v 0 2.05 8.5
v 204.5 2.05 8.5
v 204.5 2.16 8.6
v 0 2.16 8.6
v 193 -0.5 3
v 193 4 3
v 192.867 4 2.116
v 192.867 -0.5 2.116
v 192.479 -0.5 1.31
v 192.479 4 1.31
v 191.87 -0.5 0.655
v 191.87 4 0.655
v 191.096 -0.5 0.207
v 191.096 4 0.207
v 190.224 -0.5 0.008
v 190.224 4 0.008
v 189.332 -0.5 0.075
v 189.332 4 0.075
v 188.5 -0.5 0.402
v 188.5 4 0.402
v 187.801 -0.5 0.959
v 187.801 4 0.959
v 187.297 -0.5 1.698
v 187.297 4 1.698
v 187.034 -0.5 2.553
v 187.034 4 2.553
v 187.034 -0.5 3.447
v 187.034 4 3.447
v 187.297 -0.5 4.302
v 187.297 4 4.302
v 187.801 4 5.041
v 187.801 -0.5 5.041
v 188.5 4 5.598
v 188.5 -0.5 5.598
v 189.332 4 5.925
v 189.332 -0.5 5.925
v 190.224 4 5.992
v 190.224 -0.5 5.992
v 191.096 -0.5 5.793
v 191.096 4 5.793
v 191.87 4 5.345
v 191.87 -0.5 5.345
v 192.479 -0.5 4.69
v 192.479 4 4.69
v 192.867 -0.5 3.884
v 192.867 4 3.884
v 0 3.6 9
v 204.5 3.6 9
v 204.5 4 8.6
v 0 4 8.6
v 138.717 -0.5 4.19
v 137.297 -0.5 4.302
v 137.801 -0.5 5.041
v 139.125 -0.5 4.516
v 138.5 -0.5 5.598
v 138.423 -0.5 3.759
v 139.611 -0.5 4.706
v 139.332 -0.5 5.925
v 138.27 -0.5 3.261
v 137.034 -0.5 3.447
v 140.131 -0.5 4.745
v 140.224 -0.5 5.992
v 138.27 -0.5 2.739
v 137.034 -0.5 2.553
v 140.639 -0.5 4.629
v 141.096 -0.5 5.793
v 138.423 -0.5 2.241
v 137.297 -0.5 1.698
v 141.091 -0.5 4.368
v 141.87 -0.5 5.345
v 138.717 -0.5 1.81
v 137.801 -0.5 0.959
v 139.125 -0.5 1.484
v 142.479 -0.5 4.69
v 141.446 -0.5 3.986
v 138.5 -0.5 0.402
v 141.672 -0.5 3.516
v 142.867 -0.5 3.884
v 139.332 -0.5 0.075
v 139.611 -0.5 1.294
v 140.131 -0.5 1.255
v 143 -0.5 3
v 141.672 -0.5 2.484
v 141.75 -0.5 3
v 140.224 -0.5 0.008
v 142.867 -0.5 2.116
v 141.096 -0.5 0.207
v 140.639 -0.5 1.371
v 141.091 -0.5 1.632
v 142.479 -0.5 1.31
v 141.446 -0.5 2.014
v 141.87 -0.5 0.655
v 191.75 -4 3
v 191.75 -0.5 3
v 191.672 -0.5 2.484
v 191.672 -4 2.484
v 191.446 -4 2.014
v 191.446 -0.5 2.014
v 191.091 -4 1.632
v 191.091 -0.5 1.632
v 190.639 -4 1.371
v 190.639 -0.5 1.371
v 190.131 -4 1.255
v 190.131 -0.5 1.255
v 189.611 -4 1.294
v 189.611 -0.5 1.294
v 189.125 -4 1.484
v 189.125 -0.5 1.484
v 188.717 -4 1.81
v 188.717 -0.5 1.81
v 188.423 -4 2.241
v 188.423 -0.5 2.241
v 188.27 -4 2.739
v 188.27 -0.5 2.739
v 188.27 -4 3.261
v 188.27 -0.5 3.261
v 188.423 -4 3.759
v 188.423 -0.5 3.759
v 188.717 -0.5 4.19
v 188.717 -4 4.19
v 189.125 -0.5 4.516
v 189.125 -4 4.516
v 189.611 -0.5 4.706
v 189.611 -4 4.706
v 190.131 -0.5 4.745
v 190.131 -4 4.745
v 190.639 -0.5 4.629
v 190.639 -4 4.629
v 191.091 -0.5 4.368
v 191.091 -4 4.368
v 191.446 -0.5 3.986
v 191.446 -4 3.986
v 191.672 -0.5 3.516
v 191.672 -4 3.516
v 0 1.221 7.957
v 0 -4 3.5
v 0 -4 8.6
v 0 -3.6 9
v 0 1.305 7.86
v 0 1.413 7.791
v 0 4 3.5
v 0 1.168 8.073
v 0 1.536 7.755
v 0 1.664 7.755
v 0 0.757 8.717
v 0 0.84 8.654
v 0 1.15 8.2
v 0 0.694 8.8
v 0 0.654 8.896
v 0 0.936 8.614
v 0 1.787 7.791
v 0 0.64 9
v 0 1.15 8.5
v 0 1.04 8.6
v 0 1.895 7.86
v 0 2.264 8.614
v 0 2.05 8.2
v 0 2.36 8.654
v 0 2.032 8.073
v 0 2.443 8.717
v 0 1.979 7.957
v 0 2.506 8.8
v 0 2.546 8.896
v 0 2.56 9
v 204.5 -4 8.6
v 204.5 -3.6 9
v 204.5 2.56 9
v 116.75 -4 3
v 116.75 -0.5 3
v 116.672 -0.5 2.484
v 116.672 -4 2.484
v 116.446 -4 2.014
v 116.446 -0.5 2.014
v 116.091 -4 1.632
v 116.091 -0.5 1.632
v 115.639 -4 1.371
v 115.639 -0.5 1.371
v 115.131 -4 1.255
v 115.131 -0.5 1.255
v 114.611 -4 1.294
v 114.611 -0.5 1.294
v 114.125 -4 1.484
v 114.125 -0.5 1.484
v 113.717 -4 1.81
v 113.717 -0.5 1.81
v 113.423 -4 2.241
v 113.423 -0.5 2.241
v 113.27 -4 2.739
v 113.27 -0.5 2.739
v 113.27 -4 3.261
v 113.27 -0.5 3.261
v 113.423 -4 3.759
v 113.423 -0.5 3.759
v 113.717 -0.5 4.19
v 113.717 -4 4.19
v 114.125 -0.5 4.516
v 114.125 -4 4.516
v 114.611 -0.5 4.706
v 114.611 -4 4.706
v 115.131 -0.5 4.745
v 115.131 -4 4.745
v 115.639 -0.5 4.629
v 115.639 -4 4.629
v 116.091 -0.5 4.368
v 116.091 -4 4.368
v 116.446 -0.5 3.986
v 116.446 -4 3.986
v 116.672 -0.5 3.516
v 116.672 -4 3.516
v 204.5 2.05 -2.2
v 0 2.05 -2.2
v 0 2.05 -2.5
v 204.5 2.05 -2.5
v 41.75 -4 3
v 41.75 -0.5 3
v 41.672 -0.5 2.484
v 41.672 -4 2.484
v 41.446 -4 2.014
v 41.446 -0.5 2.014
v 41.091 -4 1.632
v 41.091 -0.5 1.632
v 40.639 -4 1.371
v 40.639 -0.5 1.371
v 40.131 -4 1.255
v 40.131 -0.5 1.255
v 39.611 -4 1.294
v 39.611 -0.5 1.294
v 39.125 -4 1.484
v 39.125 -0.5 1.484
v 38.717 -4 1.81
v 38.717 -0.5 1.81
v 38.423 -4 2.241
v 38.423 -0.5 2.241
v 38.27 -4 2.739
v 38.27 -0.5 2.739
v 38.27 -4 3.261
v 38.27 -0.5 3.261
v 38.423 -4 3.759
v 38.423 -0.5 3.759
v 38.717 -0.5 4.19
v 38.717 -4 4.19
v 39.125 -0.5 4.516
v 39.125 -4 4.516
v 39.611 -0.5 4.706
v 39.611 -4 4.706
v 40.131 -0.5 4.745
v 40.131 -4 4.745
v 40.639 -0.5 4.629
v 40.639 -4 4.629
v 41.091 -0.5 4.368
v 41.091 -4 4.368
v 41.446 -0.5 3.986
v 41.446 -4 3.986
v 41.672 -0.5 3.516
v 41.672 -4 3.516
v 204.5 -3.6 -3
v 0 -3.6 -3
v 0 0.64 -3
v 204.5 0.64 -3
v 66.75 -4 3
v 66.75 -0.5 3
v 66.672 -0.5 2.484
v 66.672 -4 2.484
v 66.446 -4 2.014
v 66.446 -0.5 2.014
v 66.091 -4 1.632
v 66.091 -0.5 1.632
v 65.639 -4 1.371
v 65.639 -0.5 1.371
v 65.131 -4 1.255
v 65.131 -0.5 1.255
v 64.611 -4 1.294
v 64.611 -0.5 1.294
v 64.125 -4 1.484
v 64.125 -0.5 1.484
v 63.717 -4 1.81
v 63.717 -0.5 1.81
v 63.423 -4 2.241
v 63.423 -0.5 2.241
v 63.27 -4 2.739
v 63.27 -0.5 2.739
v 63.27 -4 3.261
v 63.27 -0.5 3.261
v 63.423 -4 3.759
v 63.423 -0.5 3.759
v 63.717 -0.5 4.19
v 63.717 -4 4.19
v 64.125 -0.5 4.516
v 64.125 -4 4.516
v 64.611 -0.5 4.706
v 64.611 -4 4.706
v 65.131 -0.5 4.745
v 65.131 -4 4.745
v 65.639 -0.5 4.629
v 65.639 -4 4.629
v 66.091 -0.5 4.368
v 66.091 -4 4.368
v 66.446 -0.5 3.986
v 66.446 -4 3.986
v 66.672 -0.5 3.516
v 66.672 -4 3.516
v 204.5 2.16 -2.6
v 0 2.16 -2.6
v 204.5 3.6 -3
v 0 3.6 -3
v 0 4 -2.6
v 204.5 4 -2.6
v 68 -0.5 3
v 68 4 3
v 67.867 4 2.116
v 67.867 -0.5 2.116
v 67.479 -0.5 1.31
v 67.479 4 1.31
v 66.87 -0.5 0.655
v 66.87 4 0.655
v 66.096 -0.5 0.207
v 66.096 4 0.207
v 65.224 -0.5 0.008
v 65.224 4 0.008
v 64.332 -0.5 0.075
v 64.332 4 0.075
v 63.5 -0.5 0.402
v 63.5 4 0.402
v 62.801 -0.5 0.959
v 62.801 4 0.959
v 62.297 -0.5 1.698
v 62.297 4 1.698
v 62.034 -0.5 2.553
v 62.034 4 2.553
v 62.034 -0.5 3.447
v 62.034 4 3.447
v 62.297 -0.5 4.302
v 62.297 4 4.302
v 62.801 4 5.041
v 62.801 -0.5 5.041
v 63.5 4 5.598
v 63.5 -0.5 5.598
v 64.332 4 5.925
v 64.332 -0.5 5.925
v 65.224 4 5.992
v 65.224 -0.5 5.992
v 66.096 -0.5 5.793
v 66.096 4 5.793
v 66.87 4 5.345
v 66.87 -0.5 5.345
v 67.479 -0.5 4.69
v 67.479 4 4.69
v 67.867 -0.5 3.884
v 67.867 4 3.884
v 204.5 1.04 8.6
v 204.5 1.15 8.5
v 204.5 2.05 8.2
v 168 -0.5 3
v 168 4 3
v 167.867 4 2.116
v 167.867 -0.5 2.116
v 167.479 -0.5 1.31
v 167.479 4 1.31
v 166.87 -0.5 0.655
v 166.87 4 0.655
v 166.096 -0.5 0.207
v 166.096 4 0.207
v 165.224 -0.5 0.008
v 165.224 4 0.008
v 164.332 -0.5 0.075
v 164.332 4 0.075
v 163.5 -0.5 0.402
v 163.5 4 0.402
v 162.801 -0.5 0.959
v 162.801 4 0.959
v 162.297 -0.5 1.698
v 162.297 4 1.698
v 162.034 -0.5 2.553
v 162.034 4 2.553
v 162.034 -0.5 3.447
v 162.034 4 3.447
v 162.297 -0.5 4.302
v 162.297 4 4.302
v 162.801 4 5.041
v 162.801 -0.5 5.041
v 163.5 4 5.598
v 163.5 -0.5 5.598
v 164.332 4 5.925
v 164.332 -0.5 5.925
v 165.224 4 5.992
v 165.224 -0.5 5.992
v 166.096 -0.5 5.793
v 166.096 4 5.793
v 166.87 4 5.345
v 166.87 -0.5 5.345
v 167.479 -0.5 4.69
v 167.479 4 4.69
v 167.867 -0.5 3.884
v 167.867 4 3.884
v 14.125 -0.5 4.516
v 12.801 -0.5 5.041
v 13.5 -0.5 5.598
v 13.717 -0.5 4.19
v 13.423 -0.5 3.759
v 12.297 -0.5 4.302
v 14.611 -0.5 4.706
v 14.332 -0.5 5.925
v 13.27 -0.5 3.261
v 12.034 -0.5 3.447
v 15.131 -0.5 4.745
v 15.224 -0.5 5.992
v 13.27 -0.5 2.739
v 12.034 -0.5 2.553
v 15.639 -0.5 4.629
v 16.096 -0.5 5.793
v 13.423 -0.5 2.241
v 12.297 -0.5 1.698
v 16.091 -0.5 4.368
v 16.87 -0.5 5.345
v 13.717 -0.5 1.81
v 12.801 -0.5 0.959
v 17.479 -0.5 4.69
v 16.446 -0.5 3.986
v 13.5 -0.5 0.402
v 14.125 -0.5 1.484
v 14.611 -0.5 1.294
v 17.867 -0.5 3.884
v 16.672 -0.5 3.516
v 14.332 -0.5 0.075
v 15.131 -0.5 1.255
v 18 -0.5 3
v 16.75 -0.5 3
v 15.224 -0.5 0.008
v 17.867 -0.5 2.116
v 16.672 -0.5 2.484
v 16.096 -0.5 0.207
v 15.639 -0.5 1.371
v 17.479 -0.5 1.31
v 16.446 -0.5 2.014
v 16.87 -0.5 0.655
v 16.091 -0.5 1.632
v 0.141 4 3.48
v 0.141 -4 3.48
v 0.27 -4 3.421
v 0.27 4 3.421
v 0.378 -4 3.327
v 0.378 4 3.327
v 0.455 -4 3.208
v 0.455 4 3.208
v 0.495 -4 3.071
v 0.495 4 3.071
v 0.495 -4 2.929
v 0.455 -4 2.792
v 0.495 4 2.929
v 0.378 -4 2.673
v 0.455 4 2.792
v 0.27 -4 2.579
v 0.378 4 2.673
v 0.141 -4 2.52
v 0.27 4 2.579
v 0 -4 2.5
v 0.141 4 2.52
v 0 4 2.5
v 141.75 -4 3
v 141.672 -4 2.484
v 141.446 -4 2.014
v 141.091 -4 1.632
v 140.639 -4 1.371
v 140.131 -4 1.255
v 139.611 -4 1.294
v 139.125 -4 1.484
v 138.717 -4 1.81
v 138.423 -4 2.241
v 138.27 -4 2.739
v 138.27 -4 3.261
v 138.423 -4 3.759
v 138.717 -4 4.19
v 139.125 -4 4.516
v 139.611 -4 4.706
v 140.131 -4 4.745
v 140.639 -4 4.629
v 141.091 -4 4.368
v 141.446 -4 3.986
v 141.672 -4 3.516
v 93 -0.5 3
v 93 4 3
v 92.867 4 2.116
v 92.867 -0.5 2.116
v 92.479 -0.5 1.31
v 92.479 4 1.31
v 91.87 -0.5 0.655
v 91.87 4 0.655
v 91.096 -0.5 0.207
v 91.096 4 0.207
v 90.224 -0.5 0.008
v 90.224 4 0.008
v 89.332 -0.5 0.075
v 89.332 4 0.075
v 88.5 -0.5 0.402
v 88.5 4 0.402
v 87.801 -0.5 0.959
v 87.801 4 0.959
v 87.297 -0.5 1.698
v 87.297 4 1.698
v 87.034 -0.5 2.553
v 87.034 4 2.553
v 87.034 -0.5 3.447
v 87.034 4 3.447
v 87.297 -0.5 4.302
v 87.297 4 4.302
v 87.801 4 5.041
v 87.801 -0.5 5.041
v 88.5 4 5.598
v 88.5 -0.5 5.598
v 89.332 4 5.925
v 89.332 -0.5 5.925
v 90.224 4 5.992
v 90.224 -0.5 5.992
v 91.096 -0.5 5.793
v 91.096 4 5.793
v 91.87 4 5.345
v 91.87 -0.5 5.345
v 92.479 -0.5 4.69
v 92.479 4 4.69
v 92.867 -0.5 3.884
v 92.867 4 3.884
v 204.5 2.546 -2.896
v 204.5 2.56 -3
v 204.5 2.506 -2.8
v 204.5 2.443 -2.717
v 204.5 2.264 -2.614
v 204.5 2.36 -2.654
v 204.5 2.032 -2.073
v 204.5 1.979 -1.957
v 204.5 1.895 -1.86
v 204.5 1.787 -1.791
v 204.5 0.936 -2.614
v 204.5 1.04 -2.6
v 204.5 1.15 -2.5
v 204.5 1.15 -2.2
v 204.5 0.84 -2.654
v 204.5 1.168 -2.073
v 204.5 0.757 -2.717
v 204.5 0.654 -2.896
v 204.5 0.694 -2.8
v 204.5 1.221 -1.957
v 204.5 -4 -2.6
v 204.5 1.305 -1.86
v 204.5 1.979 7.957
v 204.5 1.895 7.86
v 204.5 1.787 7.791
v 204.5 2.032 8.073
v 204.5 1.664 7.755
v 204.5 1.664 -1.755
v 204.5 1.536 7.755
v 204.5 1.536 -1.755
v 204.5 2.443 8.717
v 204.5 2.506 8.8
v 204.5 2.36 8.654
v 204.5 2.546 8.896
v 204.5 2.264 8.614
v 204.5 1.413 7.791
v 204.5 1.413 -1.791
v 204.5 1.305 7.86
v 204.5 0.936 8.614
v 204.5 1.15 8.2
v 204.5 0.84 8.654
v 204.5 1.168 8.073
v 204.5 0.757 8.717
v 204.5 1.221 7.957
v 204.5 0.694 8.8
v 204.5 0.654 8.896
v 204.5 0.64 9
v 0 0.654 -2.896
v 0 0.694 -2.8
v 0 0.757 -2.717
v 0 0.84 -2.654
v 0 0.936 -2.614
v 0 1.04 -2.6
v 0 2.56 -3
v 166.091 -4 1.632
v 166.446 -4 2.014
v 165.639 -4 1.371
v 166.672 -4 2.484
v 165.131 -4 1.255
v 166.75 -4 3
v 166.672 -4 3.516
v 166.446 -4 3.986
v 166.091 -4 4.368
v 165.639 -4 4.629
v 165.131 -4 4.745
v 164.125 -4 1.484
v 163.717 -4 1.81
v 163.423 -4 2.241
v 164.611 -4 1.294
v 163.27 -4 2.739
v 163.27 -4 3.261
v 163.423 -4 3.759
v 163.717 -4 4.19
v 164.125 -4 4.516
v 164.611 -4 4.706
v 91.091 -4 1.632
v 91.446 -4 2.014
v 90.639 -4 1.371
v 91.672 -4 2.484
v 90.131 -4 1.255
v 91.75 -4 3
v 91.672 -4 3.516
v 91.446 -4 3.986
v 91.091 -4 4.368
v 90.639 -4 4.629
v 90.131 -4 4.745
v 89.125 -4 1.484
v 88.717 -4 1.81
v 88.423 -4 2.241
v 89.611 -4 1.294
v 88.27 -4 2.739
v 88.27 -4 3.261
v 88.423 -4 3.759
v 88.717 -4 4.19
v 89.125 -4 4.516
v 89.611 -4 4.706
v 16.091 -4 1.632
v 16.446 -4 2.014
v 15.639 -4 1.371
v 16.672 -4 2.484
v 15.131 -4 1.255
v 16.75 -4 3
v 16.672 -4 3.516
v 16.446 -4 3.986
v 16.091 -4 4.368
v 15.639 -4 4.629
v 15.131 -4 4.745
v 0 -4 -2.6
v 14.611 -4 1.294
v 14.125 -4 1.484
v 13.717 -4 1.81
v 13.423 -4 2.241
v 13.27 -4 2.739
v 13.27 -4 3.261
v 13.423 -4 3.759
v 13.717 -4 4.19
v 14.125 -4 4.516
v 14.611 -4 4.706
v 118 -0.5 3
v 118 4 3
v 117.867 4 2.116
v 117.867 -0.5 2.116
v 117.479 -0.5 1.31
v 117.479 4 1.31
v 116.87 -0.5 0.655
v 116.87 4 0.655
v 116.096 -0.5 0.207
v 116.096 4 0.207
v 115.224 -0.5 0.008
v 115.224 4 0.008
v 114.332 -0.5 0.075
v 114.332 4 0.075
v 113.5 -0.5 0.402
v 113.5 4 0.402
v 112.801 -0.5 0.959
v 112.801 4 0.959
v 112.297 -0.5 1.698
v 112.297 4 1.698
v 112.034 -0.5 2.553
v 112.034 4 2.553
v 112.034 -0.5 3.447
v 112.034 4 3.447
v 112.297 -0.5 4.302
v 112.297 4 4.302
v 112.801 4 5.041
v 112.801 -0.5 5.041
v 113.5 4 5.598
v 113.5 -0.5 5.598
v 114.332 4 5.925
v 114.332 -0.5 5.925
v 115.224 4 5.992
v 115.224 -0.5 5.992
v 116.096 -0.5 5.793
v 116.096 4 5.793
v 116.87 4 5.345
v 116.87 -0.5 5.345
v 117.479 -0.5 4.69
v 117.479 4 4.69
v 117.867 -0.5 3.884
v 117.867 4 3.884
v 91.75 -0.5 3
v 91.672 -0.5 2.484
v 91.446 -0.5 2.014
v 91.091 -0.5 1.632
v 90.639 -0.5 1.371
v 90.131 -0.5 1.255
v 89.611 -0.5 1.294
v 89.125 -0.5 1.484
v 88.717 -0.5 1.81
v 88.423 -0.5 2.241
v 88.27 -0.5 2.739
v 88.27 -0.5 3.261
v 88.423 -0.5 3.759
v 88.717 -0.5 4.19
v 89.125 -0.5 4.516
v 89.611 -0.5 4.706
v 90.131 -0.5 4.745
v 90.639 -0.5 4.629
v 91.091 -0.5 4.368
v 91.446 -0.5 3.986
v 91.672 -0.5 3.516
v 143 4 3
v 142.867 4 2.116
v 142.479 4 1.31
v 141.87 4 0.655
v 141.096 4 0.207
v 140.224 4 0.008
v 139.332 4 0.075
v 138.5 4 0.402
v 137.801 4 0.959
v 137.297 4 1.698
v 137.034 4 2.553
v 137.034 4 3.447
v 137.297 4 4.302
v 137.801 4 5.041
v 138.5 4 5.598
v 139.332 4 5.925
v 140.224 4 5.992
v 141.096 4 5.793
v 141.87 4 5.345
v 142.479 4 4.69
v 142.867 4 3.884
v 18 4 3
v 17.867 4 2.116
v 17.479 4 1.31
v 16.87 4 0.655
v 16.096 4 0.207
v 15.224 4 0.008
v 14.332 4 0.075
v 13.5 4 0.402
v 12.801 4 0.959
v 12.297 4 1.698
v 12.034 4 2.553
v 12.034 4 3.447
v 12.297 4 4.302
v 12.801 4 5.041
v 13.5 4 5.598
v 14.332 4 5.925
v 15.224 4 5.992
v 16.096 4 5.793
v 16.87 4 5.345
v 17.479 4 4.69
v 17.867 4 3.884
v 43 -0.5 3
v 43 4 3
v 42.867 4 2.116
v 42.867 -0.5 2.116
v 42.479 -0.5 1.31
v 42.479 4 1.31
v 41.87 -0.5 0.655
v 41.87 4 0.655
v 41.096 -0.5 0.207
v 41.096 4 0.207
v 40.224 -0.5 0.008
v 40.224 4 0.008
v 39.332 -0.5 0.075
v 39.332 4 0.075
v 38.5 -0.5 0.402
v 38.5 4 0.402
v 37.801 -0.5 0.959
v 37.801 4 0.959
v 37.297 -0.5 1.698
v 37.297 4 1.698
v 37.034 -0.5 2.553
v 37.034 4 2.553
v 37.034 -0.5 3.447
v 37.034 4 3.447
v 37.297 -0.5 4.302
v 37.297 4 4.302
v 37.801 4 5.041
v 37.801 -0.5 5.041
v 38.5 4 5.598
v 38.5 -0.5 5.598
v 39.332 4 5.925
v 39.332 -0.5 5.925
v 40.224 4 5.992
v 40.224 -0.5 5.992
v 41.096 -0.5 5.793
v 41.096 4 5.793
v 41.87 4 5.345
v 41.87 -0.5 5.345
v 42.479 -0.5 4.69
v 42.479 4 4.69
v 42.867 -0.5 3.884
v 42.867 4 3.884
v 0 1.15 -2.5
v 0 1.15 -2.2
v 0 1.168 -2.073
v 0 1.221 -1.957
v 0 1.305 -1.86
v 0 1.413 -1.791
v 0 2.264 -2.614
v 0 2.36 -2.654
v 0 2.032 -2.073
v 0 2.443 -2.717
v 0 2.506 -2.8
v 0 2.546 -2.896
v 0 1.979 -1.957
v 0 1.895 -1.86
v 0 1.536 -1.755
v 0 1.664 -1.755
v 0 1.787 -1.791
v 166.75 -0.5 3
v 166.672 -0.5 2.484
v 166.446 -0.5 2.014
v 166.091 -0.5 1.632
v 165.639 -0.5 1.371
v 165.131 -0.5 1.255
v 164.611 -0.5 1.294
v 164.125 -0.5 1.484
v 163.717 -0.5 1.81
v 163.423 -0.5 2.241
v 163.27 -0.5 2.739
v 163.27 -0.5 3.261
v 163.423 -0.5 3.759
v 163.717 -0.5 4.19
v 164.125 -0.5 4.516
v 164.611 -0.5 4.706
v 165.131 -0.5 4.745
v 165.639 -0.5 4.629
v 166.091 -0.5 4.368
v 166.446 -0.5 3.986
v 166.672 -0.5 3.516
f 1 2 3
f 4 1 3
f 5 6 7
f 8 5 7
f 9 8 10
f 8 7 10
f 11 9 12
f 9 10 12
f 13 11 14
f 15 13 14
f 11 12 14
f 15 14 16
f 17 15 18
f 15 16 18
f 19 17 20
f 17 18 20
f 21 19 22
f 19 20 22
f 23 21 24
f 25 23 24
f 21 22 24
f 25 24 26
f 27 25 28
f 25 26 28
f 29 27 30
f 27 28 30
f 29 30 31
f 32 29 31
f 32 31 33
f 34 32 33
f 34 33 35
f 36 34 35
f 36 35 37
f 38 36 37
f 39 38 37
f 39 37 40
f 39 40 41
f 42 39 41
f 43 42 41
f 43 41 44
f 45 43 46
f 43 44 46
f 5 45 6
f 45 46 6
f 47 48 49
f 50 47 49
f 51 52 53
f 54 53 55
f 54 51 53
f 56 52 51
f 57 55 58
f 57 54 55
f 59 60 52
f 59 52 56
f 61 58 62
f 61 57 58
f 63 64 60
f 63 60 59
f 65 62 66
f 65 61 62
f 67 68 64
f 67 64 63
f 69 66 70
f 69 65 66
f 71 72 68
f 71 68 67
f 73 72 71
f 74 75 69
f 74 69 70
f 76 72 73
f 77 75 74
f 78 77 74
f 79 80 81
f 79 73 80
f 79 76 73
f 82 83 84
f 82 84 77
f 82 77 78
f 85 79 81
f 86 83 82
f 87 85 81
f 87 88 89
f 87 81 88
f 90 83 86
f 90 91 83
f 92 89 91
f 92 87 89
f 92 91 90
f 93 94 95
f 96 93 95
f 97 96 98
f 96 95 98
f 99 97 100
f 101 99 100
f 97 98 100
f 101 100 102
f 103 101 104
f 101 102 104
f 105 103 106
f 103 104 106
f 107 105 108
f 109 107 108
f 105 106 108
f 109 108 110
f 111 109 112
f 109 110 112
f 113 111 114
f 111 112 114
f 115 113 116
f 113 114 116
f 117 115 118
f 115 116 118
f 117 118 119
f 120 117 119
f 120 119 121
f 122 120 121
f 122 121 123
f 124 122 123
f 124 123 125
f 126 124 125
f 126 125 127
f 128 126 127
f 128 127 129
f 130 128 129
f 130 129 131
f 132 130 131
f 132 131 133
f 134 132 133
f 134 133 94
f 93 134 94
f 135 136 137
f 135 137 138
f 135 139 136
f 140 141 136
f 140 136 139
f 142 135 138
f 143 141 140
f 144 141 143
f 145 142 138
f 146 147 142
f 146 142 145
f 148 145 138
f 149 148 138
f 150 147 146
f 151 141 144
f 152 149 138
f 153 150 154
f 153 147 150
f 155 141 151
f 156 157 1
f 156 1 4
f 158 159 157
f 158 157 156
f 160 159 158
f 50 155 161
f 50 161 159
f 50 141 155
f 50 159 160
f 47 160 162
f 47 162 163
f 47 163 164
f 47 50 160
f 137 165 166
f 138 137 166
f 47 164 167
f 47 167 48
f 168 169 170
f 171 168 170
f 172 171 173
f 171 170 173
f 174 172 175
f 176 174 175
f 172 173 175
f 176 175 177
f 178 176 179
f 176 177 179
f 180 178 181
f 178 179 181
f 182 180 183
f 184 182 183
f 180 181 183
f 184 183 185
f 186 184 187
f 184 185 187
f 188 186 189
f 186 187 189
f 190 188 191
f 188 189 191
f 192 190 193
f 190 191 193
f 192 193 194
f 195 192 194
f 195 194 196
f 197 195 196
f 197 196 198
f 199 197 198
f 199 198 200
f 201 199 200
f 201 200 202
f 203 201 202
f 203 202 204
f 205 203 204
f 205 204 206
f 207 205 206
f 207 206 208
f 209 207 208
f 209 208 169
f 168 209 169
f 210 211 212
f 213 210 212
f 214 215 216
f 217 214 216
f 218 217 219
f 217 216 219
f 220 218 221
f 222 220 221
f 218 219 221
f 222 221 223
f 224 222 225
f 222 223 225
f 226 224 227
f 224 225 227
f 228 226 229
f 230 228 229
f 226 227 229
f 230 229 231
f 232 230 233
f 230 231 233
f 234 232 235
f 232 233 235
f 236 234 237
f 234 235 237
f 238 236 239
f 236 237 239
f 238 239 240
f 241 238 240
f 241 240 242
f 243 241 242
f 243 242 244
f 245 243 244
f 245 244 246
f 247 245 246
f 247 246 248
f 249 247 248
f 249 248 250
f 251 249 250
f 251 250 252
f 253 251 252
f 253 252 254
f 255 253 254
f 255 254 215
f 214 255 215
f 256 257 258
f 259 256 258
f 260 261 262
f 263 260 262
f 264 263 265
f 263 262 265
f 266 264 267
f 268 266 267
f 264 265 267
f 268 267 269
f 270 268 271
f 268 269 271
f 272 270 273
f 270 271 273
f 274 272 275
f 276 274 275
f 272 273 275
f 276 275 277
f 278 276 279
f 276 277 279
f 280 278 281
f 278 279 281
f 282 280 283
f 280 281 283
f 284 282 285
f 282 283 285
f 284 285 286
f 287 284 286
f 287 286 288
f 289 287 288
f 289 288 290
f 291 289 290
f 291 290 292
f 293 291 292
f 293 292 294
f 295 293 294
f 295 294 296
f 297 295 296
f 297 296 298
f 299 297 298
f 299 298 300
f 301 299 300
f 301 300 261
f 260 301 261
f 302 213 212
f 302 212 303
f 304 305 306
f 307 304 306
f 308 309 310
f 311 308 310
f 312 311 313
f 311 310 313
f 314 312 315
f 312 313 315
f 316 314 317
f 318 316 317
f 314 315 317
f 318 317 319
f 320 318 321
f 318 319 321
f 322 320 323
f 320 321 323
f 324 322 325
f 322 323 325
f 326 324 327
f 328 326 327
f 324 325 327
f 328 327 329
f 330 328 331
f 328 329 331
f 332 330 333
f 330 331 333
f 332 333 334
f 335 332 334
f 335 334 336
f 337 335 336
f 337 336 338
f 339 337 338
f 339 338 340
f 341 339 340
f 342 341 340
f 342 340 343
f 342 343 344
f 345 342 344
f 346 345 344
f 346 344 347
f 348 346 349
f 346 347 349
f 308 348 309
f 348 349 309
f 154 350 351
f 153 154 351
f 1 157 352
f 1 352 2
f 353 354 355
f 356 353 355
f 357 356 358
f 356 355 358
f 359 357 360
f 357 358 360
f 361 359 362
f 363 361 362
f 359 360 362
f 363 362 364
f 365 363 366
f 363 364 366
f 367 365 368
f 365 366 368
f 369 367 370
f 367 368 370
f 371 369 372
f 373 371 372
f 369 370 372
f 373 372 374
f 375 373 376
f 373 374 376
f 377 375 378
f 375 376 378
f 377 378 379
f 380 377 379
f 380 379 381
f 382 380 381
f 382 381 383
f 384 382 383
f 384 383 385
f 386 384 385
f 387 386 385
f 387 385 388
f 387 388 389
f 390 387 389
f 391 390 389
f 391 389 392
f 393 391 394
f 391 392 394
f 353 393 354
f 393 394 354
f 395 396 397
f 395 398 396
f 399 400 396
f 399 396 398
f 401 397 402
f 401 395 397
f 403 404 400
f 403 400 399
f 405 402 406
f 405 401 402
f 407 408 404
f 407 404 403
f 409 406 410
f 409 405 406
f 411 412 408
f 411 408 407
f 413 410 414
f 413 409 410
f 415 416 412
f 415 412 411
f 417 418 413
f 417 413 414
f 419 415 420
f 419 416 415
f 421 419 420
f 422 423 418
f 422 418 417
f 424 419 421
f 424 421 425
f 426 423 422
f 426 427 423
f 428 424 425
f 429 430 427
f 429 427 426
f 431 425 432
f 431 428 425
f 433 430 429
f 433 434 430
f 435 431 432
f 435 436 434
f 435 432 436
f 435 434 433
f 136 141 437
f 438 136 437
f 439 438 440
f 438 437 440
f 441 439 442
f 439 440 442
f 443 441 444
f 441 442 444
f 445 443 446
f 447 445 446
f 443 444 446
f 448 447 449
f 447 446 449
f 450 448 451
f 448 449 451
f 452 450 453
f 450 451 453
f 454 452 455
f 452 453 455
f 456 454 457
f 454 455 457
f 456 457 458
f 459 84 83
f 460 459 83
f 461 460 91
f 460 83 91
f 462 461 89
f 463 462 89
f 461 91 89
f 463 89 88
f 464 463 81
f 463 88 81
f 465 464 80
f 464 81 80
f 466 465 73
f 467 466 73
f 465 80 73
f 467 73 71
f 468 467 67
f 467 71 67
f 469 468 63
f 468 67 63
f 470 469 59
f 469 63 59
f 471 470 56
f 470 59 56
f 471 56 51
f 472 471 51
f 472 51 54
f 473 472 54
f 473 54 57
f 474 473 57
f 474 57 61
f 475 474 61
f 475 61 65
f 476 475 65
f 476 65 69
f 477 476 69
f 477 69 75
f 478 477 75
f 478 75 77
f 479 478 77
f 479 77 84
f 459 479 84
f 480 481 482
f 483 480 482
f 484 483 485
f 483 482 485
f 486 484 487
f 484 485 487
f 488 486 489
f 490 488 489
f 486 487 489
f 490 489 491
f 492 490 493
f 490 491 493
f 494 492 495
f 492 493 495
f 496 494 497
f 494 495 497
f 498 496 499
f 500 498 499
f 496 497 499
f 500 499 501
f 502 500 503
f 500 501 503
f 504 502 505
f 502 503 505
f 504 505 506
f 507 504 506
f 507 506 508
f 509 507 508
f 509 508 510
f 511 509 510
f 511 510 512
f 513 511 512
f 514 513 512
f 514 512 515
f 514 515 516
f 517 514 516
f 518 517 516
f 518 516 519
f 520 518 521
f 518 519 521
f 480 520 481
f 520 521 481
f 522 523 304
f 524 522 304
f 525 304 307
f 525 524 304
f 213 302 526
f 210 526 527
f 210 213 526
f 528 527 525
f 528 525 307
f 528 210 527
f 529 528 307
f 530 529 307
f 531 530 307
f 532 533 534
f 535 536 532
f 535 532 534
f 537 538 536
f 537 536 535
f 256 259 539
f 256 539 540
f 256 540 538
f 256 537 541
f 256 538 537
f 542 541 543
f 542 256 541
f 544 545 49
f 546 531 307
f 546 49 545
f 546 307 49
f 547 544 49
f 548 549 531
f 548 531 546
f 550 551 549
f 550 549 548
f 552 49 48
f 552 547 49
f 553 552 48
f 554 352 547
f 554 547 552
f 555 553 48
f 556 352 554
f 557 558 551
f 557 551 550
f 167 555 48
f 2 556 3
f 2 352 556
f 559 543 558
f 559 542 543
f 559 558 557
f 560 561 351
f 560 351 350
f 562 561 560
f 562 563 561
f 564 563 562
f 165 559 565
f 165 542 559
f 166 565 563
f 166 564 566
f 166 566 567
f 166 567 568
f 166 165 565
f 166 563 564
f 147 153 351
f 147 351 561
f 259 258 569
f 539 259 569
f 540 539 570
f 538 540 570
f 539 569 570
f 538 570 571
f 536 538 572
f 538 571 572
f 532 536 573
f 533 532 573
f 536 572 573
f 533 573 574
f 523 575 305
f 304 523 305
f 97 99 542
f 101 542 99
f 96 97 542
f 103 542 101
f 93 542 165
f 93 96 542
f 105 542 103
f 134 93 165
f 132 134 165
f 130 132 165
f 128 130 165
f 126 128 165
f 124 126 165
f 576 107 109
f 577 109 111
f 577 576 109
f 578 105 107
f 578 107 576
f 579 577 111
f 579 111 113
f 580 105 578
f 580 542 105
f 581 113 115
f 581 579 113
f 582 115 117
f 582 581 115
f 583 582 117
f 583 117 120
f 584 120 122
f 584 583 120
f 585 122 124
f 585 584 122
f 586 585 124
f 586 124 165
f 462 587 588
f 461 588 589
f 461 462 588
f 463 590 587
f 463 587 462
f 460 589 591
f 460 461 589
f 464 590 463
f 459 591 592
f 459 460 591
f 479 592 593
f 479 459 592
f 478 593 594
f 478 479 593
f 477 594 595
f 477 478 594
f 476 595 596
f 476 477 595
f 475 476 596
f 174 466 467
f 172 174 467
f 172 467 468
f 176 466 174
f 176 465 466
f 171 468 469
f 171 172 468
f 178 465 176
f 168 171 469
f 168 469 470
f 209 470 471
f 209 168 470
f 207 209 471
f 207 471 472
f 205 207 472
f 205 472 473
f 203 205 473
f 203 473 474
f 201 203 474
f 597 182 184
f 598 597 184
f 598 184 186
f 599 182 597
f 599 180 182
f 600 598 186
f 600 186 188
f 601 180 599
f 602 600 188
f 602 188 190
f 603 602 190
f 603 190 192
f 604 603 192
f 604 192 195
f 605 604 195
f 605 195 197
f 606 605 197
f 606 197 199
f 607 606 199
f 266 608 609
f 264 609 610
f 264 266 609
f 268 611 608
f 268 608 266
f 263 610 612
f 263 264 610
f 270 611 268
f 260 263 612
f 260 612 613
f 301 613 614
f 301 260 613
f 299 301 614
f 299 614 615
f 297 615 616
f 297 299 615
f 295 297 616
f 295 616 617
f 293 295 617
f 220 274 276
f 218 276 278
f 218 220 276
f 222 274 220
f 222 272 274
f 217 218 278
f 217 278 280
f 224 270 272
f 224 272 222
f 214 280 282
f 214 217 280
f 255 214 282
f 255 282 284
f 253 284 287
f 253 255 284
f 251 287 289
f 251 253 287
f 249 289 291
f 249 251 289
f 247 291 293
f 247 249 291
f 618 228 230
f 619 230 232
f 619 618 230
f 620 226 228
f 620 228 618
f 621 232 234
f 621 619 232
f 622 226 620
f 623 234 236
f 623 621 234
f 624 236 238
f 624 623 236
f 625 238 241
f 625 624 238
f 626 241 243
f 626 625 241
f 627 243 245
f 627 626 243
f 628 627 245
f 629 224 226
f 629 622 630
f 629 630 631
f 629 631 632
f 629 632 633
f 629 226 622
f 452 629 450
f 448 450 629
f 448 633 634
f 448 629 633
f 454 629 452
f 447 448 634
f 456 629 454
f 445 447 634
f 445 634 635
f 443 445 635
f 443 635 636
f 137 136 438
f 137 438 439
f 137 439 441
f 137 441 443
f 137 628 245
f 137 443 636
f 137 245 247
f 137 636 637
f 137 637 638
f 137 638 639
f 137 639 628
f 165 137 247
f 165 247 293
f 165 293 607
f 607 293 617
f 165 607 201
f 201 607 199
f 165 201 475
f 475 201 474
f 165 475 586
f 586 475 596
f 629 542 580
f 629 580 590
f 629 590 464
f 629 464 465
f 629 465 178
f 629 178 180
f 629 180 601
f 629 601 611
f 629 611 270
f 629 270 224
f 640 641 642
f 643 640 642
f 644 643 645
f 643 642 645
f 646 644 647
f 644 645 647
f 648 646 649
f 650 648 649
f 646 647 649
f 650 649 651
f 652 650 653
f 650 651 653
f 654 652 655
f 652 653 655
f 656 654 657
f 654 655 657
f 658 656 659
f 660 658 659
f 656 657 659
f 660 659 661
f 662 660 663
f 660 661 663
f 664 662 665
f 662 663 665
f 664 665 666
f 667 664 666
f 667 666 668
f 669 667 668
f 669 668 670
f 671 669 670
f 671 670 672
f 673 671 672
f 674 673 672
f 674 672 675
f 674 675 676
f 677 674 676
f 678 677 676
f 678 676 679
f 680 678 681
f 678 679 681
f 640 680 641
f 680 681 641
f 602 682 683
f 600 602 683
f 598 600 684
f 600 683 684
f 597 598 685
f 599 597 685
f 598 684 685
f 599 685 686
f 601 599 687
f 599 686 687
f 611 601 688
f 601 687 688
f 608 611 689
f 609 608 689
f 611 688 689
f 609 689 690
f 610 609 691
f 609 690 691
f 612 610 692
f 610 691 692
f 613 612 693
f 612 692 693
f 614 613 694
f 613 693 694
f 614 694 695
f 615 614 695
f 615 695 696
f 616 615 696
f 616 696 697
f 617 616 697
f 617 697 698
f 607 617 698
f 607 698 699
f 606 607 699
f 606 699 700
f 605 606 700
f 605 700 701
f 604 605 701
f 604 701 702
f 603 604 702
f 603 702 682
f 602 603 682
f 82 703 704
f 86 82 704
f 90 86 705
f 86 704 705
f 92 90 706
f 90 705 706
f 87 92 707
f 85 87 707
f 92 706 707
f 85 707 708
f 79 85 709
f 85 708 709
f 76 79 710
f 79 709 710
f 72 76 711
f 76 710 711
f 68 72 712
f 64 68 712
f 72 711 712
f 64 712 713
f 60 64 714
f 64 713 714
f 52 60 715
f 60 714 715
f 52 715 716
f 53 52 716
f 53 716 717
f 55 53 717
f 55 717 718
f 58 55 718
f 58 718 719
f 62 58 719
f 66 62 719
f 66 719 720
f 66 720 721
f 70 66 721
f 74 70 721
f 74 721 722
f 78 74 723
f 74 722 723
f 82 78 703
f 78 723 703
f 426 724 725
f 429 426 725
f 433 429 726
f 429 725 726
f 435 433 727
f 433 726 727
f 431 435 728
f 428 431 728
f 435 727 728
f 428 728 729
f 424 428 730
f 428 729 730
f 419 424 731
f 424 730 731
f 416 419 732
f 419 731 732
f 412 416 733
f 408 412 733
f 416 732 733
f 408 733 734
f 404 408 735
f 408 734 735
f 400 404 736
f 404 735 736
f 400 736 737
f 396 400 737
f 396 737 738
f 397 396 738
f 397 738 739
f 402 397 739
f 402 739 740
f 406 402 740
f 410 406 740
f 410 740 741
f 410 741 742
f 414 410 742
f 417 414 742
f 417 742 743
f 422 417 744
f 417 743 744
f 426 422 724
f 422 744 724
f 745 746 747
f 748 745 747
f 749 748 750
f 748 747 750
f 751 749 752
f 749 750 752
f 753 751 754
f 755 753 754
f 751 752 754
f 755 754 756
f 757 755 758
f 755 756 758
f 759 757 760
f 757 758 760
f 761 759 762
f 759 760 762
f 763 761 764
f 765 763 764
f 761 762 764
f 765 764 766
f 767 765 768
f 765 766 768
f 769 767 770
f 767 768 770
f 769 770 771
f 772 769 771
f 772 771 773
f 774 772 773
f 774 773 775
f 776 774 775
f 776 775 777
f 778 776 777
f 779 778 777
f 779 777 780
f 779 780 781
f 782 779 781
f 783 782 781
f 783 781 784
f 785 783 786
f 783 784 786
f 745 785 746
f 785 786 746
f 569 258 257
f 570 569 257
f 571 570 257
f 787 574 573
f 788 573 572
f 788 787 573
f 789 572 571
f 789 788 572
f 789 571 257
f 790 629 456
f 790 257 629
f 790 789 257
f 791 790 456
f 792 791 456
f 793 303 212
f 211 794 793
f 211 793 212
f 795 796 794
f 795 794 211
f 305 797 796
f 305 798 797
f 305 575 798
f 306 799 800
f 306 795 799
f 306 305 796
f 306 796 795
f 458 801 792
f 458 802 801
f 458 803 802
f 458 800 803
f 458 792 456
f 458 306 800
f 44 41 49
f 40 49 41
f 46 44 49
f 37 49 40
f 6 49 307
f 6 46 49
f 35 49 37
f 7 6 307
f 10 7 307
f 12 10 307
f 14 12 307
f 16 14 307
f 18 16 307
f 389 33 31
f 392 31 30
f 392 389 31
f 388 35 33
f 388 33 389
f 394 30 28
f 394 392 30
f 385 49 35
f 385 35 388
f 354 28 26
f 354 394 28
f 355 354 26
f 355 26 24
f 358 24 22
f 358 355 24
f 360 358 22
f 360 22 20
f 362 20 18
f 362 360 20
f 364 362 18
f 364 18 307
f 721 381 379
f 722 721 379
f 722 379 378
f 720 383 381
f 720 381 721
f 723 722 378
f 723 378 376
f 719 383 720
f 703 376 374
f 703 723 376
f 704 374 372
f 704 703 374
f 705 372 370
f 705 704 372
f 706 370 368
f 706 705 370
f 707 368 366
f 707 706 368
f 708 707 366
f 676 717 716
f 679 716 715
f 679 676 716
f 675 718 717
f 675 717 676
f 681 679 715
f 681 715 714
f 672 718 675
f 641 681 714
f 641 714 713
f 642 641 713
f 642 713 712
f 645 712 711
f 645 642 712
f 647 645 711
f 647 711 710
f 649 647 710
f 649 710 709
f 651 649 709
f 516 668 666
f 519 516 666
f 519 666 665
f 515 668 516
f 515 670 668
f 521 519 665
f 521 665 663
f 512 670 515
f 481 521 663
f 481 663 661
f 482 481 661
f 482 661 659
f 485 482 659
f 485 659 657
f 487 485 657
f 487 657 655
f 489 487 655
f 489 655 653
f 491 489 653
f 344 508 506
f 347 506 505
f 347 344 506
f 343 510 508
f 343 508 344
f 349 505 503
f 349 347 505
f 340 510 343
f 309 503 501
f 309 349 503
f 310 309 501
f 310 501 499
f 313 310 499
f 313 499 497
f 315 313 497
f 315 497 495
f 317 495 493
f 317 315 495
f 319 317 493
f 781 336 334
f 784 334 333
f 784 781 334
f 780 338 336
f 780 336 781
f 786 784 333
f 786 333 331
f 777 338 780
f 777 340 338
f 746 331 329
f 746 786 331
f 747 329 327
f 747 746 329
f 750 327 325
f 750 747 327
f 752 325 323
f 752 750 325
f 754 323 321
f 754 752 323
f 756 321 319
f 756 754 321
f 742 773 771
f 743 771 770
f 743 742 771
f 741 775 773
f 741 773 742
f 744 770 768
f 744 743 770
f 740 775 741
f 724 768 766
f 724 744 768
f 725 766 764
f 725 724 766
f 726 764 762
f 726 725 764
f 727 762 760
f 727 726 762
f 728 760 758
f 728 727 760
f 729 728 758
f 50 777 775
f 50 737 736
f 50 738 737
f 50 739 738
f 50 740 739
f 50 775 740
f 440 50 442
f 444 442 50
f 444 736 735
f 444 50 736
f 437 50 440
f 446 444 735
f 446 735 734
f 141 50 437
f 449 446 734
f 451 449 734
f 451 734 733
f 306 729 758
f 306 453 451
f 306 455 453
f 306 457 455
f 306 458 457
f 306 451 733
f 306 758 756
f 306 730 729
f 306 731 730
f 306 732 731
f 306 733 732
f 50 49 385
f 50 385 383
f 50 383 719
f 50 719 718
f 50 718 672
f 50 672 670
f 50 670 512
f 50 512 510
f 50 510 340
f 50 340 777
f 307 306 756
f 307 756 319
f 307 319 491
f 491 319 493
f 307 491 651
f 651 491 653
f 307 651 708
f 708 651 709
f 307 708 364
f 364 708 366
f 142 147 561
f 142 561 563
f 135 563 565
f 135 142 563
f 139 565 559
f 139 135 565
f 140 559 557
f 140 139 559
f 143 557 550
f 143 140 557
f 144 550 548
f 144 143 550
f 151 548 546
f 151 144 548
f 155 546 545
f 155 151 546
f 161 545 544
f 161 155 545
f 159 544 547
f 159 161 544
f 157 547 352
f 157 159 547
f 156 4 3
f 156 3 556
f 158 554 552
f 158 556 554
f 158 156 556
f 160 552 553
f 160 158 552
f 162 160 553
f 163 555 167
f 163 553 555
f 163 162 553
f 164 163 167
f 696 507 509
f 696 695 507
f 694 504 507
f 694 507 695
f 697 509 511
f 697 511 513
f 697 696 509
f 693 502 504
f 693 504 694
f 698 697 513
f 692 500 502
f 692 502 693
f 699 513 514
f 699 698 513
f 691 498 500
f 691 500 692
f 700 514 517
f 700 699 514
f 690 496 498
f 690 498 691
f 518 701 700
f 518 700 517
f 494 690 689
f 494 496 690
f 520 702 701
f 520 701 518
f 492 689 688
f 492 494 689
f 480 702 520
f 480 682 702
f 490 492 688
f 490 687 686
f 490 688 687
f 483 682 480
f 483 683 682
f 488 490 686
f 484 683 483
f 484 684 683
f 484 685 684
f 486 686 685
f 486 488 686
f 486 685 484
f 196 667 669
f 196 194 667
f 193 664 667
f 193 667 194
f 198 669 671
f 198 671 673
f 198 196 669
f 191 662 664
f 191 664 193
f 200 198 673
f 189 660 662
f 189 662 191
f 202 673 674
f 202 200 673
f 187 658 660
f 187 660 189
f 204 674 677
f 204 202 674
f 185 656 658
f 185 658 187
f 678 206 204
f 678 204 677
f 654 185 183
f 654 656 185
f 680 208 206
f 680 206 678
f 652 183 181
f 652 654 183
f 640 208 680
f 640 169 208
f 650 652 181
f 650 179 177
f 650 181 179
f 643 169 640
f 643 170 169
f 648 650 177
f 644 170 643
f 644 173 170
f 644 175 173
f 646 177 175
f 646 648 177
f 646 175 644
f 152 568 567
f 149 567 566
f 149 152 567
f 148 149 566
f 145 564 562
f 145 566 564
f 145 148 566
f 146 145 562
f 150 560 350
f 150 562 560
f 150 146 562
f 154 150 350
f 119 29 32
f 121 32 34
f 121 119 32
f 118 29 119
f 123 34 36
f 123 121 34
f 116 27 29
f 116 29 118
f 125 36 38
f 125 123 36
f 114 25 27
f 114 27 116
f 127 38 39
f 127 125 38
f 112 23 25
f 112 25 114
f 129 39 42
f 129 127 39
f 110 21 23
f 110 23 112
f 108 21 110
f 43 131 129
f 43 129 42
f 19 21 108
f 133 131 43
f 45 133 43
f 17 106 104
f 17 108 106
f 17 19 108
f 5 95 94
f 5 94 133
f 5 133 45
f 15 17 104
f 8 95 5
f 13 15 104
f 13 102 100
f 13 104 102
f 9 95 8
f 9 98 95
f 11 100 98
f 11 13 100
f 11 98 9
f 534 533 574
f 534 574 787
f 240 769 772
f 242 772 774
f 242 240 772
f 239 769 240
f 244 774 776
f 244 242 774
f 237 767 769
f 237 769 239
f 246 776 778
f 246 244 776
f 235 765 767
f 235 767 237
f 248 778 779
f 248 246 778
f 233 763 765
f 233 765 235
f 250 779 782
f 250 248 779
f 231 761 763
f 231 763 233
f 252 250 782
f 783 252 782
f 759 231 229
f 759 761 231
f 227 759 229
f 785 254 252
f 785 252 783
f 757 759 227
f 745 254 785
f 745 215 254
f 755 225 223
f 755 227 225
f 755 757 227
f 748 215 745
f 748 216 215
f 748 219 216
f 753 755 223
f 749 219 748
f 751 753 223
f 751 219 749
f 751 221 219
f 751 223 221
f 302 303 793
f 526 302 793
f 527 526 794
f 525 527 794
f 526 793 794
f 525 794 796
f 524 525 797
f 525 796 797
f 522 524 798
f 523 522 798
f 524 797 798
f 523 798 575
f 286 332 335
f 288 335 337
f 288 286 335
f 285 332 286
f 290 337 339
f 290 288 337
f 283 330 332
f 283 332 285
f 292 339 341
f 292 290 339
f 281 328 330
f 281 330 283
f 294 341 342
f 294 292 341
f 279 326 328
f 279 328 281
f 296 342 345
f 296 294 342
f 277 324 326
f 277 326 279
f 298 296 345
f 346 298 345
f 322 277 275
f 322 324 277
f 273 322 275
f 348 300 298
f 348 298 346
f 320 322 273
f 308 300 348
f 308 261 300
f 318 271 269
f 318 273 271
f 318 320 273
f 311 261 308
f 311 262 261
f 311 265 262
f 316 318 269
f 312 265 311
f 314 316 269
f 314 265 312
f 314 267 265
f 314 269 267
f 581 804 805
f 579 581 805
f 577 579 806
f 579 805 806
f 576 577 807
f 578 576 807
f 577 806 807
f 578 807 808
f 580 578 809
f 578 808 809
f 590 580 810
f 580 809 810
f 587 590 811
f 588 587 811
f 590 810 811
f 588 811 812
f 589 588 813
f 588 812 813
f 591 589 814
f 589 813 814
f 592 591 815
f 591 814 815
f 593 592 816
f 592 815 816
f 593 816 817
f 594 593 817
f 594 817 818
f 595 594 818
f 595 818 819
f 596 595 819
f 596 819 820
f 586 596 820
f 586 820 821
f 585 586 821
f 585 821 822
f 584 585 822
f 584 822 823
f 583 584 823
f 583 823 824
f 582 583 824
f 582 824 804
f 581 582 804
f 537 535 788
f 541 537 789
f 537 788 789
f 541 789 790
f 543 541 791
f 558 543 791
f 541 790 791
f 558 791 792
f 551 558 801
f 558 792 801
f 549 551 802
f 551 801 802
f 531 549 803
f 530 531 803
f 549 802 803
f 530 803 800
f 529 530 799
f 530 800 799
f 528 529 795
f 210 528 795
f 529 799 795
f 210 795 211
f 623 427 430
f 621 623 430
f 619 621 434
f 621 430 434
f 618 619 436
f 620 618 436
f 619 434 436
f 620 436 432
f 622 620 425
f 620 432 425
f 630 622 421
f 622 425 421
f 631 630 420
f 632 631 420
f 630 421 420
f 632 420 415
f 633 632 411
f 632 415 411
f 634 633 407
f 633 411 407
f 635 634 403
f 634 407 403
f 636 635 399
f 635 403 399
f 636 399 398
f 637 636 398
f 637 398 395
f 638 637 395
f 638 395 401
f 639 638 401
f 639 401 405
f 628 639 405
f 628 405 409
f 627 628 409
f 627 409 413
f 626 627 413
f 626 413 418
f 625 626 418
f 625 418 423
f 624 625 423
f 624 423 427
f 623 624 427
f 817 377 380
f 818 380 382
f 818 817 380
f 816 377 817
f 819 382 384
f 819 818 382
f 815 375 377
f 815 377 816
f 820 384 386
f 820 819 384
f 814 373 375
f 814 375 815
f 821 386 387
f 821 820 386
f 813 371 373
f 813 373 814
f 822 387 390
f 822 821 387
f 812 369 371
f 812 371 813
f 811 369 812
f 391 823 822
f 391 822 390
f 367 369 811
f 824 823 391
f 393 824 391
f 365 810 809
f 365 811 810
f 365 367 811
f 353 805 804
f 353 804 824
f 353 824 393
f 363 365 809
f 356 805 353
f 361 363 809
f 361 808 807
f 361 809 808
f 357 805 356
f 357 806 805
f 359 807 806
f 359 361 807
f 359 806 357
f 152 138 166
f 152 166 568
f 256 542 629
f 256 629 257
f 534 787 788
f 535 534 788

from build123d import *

# Parameters (mm, degrees)
BOSS_EXTRUDE1_DEPTH = 480
SKETCH2_R           = 1.75
CUT_EXTRUDE1_DEPTH  = 60
SKETCH3_R           = 3
CUT_EXTRUDE2_DEPTH  = 4.5
SKETCH4_R           = 0.5
CUT_EXTRUDE3_DEPTH  = 14.5
LPATTERN1_COUNT     = 19
LPATTERN1_PITCH     = 25
SKETCH5_W           = 307.473563077
SKETCH5_H           = 32.361597021
CUT_EXTRUDE4_DEPTH  = 9


with BuildPart() as part:
    # Sketch1 → Boss-Extrude1 (new body)
    with BuildSketch(Plane(origin=(0, 0, 0), x_dir=(0, 0, -1), z_dir=(1, 0, 0))):
        with BuildLine():
            Line((-3, -4), (2.6, -4))
            Line((2.6, -4), (3, -3.6))
            Line((3, -3.6), (3, 0.64))
            ThreePointArc((3, 0.64), (2.717157288, 0.757157288), (2.6, 1.04))
            Line((2.6, 1.04), (2.5, 1.15))
            Line((2.5, 1.15), (2.2, 1.15))
            ThreePointArc((2.2, 1.15), (1.75, 1.6), (2.2, 2.05))
            Line((2.2, 2.05), (2.5, 2.05))
            Line((2.5, 2.05), (2.6, 2.16))
            ThreePointArc((2.6, 2.16), (2.717157288, 2.442842712), (3, 2.56))
            Line((3, 2.56), (3, 3.6))
            Line((3, 3.6), (2.6, 4))
            Line((2.6, 4), (-3, 4))
            Line((-3, 4), (-3, -4))
        make_face()
    boss_extrude1 = extrude(amount=BOSS_EXTRUDE1_DEPTH)

    # Mirror1: Boss-Extrude1 across plane
    add(boss_extrude1.mirror(Plane(origin=(480, -4, 3), x_dir=(1, 0, 0), z_dir=(0, 0, -1))))

    # Sketch2 → Cut-Extrude1 (cut)
    with BuildSketch(Plane(origin=(0, 4, 0), x_dir=(1, 0, 0), z_dir=(0, 1, 0))):
        with Locations((15, -3)):
            Circle(SKETCH2_R)
    cut_extrude1 = extrude(amount=-CUT_EXTRUDE1_DEPTH, mode=Mode.SUBTRACT)

    # Sketch3 → Cut-Extrude2 (cut)
    with BuildSketch(Plane(origin=(0, 4, 0), x_dir=(1, 0, 0), z_dir=(0, 1, 0))):
        with Locations((15, -3)):
            Circle(SKETCH3_R)
    cut_extrude2 = extrude(amount=-CUT_EXTRUDE2_DEPTH, mode=Mode.SUBTRACT)

    # Sketch4 → Cut-Extrude3 (cut)
    with BuildSketch(Plane(origin=(0, 4, 0), x_dir=(1, 0, 0), z_dir=(0, 1, 0))):
        with Locations((0, -3)):
            Circle(SKETCH4_R)
    extrude(amount=-CUT_EXTRUDE3_DEPTH, mode=Mode.SUBTRACT)

    # LPattern1: Cut-Extrude1, Cut-Extrude2 ×19
    with Locations(*[(i * LPATTERN1_PITCH, 0, 0) for i in range(1, LPATTERN1_COUNT)]):
        add(cut_extrude1, mode=Mode.SUBTRACT)
        add(cut_extrude2, mode=Mode.SUBTRACT)

    # Sketch5 → Cut-Extrude4 (cut, through all)
    with BuildSketch(Plane.XZ.offset(4)):
        with Locations((358.236781539, 13.180798511)):
            Rectangle(SKETCH5_W, SKETCH5_H)
    extrude(amount=-CUT_EXTRUDE4_DEPTH, mode=Mode.SUBTRACT)


solid = part.part
